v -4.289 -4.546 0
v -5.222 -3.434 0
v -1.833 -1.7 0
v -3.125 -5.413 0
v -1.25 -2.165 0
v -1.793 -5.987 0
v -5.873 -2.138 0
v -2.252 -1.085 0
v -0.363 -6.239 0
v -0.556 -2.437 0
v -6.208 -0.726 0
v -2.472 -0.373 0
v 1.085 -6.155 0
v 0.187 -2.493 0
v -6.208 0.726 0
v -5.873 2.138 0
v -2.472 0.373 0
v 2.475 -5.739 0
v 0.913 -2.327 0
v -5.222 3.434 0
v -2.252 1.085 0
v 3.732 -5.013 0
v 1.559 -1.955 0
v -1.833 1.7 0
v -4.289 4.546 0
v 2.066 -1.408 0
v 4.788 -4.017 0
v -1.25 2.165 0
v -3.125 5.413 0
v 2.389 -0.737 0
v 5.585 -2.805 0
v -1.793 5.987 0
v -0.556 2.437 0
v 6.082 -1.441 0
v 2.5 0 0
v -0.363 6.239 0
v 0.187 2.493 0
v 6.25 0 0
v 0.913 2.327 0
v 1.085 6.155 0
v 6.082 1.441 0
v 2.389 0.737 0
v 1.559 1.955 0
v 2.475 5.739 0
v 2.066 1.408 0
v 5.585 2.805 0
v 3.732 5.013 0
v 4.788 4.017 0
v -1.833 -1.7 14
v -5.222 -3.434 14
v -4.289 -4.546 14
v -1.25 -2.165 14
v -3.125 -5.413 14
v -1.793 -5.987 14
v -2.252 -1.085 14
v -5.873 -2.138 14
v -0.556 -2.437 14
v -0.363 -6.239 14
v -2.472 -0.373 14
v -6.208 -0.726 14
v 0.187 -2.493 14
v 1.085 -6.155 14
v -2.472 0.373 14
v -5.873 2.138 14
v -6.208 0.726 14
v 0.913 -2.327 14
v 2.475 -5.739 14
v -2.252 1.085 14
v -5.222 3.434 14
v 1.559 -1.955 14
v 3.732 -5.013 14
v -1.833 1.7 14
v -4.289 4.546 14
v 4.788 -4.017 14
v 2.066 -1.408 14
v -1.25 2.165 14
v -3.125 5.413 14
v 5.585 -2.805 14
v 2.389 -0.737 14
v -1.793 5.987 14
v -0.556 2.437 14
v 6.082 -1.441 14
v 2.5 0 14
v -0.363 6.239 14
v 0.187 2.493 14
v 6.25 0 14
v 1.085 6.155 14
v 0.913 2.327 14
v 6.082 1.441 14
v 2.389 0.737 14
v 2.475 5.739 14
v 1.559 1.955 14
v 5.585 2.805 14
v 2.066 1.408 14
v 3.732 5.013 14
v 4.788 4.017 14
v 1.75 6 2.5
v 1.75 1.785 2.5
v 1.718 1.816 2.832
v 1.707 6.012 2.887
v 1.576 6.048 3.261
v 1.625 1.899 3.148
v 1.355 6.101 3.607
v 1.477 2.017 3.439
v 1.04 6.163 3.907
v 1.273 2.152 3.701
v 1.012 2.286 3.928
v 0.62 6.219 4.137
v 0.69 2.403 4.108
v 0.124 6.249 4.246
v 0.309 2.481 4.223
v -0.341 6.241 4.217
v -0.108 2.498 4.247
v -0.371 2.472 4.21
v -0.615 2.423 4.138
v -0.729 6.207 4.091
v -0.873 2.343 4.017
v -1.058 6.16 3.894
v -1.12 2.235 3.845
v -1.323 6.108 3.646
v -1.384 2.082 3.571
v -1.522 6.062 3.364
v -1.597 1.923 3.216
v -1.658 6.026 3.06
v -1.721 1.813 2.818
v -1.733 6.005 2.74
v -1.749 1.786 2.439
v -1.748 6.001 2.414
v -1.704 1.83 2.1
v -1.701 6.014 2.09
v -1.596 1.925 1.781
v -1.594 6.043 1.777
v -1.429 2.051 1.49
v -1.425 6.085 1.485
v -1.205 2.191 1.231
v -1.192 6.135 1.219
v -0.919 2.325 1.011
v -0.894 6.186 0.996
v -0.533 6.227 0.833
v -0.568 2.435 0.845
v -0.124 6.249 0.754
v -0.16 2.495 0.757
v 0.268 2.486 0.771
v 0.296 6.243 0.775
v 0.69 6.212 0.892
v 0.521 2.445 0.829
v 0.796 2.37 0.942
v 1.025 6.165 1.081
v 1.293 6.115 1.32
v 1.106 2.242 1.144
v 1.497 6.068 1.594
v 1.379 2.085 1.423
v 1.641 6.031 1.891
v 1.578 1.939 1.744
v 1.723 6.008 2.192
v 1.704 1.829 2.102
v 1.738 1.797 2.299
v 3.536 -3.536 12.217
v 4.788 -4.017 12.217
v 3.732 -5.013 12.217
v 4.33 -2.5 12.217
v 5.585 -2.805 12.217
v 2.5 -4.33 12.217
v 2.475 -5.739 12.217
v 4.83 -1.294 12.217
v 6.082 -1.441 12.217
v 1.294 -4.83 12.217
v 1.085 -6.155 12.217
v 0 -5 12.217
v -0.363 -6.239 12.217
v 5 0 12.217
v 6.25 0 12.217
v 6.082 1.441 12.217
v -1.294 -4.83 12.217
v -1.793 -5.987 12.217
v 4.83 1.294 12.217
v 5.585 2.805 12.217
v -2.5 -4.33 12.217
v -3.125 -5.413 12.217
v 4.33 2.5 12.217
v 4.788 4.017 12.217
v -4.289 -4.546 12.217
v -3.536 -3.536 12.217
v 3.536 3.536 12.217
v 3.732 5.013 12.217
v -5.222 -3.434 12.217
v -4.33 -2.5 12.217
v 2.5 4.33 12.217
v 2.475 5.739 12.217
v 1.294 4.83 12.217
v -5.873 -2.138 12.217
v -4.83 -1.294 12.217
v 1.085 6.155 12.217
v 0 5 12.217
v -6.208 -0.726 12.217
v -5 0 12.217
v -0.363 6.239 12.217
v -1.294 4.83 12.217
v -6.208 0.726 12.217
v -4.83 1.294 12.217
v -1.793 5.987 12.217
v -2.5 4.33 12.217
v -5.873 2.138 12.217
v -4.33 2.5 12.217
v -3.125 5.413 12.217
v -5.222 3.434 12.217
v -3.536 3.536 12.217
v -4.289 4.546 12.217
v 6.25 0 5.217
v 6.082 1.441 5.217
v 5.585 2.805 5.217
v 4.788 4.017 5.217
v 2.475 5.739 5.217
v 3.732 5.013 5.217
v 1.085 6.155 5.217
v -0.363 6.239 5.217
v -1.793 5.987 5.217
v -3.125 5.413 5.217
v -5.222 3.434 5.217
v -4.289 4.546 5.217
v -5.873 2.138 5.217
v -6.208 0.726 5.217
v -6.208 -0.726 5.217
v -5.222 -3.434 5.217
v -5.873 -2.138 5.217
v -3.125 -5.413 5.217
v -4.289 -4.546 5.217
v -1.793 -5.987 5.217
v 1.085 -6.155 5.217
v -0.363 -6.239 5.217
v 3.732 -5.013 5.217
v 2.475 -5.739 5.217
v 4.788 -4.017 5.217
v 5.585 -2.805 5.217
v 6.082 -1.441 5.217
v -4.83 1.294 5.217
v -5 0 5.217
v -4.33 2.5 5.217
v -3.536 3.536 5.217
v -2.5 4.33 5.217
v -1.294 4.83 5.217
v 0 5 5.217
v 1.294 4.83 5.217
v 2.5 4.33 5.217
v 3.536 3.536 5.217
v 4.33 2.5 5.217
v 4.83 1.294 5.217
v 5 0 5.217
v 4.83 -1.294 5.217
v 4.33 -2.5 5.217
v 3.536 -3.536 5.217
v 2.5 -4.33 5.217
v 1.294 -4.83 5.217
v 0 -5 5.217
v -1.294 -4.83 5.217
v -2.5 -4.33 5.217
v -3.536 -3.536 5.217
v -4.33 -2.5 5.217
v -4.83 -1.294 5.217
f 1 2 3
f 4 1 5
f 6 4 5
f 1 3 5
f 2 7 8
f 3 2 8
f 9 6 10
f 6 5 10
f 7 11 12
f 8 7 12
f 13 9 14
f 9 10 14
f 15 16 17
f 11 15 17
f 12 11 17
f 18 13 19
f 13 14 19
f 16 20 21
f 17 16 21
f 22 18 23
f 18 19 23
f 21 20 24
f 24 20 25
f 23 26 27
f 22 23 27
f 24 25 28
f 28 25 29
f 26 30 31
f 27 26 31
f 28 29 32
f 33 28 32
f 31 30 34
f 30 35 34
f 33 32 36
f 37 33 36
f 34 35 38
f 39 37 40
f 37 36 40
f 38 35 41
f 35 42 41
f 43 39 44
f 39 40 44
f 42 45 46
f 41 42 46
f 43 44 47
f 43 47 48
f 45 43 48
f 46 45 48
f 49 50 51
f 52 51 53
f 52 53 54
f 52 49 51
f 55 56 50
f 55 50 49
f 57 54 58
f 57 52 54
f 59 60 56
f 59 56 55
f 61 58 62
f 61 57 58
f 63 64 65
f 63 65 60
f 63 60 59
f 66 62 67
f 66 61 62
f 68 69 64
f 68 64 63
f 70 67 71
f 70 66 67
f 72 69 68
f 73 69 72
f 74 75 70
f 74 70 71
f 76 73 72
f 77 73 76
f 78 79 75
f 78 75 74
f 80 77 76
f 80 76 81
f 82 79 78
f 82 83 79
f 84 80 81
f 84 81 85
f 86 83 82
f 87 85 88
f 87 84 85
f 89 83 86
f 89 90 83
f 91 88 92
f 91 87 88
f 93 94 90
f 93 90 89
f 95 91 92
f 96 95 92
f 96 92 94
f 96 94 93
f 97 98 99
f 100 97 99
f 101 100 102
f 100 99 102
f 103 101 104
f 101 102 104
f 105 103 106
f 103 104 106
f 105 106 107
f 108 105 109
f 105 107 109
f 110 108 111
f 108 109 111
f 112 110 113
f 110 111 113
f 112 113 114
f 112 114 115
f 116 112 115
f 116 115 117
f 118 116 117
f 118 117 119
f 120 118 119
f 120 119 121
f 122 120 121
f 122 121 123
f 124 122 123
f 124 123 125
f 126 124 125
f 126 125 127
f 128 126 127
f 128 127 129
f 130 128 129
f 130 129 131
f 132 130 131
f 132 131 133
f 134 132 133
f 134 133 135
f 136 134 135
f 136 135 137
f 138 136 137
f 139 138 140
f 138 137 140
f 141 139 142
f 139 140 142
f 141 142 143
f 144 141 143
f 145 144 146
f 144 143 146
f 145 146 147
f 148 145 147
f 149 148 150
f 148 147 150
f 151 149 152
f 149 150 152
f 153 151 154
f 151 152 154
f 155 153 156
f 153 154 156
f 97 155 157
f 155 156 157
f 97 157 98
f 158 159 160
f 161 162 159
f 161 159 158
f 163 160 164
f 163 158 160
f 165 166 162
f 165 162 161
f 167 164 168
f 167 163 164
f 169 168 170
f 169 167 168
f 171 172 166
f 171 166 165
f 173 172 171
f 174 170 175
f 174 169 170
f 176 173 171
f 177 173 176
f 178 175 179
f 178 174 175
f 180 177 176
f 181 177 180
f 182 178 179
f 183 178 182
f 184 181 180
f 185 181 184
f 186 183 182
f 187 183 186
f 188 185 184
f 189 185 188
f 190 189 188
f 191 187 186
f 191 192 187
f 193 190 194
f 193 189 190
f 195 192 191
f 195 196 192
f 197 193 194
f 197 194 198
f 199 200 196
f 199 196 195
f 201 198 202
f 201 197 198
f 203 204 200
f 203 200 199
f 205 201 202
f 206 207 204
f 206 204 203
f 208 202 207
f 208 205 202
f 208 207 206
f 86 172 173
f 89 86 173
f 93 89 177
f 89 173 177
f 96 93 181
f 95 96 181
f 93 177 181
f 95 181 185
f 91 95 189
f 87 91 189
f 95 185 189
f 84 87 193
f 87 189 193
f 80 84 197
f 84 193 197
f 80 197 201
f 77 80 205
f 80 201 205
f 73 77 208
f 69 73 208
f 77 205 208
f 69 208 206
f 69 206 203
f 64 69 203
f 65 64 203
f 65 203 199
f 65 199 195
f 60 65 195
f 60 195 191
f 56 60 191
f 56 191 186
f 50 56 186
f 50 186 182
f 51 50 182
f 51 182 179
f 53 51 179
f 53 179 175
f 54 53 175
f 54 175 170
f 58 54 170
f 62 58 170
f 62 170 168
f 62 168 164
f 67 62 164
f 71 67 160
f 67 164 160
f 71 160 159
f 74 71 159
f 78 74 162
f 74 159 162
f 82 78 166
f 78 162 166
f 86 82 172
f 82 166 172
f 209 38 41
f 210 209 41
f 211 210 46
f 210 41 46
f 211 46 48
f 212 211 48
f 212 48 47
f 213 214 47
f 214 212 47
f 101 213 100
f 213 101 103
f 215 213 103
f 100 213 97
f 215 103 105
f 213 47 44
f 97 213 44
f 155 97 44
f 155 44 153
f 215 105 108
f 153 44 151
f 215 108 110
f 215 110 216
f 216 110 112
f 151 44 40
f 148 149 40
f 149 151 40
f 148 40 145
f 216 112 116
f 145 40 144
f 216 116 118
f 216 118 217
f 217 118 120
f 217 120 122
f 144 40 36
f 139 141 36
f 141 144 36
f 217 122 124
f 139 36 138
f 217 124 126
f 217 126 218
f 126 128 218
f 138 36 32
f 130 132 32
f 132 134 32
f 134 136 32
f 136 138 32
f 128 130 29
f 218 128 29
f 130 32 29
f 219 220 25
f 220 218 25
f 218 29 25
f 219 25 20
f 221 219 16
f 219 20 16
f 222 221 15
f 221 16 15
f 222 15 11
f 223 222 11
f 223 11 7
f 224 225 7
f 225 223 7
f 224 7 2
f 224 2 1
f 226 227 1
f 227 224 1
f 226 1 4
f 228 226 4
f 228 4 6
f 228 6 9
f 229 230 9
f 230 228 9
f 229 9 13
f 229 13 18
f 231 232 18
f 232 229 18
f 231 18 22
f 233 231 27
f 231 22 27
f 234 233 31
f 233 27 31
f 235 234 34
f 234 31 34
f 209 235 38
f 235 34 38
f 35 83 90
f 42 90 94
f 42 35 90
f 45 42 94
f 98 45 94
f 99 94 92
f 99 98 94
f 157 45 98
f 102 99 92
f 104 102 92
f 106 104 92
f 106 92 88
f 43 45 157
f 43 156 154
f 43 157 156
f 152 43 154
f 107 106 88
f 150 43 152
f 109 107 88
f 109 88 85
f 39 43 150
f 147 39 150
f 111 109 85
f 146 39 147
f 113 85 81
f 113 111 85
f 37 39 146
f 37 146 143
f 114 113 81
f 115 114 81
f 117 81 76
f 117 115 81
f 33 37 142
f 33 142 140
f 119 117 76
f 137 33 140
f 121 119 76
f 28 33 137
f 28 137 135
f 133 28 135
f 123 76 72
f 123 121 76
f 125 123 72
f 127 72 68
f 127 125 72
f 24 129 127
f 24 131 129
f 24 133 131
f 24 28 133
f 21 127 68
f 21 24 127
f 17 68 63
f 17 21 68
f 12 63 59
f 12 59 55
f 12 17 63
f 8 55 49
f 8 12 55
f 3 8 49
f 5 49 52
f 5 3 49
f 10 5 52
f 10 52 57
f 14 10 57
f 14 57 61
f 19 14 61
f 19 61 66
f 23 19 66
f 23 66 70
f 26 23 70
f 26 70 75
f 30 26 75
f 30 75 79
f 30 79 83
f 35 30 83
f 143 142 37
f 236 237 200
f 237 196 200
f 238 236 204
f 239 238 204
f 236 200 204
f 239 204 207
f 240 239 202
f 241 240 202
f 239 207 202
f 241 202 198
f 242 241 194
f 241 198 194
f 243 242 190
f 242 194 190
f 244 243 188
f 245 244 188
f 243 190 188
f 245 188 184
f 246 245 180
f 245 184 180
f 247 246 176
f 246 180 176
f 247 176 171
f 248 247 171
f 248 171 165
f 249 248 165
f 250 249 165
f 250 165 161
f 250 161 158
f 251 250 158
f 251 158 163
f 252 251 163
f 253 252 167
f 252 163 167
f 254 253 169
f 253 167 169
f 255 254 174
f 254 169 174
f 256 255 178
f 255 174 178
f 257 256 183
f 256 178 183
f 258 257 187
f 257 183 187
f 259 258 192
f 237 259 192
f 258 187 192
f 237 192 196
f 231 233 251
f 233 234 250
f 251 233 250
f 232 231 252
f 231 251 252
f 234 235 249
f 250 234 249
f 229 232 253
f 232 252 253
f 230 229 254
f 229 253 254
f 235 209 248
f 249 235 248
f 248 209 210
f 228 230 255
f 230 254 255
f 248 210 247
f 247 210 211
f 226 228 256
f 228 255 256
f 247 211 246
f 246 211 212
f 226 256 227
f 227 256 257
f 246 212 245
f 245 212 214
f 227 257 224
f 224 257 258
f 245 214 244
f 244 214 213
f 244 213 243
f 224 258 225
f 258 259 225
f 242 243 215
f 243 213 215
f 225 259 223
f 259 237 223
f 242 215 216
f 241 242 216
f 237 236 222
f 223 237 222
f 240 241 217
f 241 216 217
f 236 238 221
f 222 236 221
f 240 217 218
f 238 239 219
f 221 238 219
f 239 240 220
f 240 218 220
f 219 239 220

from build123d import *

# Parameters (mm, degrees)
F0_R     = 6.25
F0_R_2   = 2.5
F1_DEPTH = 14
F2_W     = 3.733449
F2_H     = 7
F4_R     = 1.75
F5_DEPTH = 25


with BuildPart() as f1:
    # F0 (on Top) → F1 (new body)
    with BuildSketch(Plane.XY):
        Circle(F0_R)
        Circle(F0_R_2, mode=Mode.SUBTRACT)
    extrude(amount=F1_DEPTH)

    # F2 (on Front) → F3 (revolve, cut)
    with BuildSketch(Plane.XZ):
        with Locations((-6.866725, 8.717095)):
            Rectangle(F2_W, F2_H)
    revolve(axis=Axis((0, 0, 7.230911), (0, 0, -1)), mode=Mode.SUBTRACT)

    # F4 (on Front) → F5 (cut)
    with BuildSketch(Plane.XZ):
        with Locations((0, 2.5)):
            Circle(F4_R)
    extrude(amount=-F5_DEPTH, mode=Mode.SUBTRACT)


solid = f1.part
